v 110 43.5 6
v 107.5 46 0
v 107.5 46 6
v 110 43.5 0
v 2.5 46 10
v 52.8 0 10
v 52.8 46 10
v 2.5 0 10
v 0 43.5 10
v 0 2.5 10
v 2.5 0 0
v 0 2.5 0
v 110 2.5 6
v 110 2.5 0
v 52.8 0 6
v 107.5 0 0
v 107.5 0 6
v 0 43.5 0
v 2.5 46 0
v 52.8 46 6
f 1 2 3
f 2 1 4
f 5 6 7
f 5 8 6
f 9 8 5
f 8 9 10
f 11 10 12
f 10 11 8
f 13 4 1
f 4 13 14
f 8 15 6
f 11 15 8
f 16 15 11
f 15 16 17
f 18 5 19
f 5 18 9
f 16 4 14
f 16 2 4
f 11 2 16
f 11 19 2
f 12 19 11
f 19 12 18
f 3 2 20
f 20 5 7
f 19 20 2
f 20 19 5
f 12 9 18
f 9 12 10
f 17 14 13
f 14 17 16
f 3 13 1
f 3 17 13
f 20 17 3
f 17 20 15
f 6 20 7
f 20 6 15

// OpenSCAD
$fn = 32;

// ----------------------------------------------------------------------
// Stepped bar: endstep, 110 x 46 x 10/6 mm
// ----------------------------------------------------------------------

// --- parameters (mm) ---
bar_l = 110;              // bar length, X
bar_w = 46;               // bar width, Y
plate_t = 10;             // thickness of the thick zone, Z
thin_t = 6;               // thickness of the thin zone
corner_c = 2.5;           // corner chamfer of the bar
step_cut = 4;             // material removed from the thin zone
step_x = 52.8;            // step position from the left end
depth_1 = 4;              // depth of cut 1 from the top face

profile = [[2.5, 0], [107.5, 0], [110, 2.5], [110, 43.5], [107.5, 46], [2.5, 46], [0, 43.5], [0, 2.5]];  // primary outline, 8 points, counter clockwise
void_1 = [[52.8, -1], [111, -1], [111, 47], [52.8, 47]];  // thin zone beyond the step, 4 points

// --- the one profile operation ---
difference() {
  linear_extrude(height = plate_t) polygon(points = profile);
  translate([0, 0, plate_t - depth_1])
    linear_extrude(height = depth_1 + 1) polygon(points = void_1);
}
